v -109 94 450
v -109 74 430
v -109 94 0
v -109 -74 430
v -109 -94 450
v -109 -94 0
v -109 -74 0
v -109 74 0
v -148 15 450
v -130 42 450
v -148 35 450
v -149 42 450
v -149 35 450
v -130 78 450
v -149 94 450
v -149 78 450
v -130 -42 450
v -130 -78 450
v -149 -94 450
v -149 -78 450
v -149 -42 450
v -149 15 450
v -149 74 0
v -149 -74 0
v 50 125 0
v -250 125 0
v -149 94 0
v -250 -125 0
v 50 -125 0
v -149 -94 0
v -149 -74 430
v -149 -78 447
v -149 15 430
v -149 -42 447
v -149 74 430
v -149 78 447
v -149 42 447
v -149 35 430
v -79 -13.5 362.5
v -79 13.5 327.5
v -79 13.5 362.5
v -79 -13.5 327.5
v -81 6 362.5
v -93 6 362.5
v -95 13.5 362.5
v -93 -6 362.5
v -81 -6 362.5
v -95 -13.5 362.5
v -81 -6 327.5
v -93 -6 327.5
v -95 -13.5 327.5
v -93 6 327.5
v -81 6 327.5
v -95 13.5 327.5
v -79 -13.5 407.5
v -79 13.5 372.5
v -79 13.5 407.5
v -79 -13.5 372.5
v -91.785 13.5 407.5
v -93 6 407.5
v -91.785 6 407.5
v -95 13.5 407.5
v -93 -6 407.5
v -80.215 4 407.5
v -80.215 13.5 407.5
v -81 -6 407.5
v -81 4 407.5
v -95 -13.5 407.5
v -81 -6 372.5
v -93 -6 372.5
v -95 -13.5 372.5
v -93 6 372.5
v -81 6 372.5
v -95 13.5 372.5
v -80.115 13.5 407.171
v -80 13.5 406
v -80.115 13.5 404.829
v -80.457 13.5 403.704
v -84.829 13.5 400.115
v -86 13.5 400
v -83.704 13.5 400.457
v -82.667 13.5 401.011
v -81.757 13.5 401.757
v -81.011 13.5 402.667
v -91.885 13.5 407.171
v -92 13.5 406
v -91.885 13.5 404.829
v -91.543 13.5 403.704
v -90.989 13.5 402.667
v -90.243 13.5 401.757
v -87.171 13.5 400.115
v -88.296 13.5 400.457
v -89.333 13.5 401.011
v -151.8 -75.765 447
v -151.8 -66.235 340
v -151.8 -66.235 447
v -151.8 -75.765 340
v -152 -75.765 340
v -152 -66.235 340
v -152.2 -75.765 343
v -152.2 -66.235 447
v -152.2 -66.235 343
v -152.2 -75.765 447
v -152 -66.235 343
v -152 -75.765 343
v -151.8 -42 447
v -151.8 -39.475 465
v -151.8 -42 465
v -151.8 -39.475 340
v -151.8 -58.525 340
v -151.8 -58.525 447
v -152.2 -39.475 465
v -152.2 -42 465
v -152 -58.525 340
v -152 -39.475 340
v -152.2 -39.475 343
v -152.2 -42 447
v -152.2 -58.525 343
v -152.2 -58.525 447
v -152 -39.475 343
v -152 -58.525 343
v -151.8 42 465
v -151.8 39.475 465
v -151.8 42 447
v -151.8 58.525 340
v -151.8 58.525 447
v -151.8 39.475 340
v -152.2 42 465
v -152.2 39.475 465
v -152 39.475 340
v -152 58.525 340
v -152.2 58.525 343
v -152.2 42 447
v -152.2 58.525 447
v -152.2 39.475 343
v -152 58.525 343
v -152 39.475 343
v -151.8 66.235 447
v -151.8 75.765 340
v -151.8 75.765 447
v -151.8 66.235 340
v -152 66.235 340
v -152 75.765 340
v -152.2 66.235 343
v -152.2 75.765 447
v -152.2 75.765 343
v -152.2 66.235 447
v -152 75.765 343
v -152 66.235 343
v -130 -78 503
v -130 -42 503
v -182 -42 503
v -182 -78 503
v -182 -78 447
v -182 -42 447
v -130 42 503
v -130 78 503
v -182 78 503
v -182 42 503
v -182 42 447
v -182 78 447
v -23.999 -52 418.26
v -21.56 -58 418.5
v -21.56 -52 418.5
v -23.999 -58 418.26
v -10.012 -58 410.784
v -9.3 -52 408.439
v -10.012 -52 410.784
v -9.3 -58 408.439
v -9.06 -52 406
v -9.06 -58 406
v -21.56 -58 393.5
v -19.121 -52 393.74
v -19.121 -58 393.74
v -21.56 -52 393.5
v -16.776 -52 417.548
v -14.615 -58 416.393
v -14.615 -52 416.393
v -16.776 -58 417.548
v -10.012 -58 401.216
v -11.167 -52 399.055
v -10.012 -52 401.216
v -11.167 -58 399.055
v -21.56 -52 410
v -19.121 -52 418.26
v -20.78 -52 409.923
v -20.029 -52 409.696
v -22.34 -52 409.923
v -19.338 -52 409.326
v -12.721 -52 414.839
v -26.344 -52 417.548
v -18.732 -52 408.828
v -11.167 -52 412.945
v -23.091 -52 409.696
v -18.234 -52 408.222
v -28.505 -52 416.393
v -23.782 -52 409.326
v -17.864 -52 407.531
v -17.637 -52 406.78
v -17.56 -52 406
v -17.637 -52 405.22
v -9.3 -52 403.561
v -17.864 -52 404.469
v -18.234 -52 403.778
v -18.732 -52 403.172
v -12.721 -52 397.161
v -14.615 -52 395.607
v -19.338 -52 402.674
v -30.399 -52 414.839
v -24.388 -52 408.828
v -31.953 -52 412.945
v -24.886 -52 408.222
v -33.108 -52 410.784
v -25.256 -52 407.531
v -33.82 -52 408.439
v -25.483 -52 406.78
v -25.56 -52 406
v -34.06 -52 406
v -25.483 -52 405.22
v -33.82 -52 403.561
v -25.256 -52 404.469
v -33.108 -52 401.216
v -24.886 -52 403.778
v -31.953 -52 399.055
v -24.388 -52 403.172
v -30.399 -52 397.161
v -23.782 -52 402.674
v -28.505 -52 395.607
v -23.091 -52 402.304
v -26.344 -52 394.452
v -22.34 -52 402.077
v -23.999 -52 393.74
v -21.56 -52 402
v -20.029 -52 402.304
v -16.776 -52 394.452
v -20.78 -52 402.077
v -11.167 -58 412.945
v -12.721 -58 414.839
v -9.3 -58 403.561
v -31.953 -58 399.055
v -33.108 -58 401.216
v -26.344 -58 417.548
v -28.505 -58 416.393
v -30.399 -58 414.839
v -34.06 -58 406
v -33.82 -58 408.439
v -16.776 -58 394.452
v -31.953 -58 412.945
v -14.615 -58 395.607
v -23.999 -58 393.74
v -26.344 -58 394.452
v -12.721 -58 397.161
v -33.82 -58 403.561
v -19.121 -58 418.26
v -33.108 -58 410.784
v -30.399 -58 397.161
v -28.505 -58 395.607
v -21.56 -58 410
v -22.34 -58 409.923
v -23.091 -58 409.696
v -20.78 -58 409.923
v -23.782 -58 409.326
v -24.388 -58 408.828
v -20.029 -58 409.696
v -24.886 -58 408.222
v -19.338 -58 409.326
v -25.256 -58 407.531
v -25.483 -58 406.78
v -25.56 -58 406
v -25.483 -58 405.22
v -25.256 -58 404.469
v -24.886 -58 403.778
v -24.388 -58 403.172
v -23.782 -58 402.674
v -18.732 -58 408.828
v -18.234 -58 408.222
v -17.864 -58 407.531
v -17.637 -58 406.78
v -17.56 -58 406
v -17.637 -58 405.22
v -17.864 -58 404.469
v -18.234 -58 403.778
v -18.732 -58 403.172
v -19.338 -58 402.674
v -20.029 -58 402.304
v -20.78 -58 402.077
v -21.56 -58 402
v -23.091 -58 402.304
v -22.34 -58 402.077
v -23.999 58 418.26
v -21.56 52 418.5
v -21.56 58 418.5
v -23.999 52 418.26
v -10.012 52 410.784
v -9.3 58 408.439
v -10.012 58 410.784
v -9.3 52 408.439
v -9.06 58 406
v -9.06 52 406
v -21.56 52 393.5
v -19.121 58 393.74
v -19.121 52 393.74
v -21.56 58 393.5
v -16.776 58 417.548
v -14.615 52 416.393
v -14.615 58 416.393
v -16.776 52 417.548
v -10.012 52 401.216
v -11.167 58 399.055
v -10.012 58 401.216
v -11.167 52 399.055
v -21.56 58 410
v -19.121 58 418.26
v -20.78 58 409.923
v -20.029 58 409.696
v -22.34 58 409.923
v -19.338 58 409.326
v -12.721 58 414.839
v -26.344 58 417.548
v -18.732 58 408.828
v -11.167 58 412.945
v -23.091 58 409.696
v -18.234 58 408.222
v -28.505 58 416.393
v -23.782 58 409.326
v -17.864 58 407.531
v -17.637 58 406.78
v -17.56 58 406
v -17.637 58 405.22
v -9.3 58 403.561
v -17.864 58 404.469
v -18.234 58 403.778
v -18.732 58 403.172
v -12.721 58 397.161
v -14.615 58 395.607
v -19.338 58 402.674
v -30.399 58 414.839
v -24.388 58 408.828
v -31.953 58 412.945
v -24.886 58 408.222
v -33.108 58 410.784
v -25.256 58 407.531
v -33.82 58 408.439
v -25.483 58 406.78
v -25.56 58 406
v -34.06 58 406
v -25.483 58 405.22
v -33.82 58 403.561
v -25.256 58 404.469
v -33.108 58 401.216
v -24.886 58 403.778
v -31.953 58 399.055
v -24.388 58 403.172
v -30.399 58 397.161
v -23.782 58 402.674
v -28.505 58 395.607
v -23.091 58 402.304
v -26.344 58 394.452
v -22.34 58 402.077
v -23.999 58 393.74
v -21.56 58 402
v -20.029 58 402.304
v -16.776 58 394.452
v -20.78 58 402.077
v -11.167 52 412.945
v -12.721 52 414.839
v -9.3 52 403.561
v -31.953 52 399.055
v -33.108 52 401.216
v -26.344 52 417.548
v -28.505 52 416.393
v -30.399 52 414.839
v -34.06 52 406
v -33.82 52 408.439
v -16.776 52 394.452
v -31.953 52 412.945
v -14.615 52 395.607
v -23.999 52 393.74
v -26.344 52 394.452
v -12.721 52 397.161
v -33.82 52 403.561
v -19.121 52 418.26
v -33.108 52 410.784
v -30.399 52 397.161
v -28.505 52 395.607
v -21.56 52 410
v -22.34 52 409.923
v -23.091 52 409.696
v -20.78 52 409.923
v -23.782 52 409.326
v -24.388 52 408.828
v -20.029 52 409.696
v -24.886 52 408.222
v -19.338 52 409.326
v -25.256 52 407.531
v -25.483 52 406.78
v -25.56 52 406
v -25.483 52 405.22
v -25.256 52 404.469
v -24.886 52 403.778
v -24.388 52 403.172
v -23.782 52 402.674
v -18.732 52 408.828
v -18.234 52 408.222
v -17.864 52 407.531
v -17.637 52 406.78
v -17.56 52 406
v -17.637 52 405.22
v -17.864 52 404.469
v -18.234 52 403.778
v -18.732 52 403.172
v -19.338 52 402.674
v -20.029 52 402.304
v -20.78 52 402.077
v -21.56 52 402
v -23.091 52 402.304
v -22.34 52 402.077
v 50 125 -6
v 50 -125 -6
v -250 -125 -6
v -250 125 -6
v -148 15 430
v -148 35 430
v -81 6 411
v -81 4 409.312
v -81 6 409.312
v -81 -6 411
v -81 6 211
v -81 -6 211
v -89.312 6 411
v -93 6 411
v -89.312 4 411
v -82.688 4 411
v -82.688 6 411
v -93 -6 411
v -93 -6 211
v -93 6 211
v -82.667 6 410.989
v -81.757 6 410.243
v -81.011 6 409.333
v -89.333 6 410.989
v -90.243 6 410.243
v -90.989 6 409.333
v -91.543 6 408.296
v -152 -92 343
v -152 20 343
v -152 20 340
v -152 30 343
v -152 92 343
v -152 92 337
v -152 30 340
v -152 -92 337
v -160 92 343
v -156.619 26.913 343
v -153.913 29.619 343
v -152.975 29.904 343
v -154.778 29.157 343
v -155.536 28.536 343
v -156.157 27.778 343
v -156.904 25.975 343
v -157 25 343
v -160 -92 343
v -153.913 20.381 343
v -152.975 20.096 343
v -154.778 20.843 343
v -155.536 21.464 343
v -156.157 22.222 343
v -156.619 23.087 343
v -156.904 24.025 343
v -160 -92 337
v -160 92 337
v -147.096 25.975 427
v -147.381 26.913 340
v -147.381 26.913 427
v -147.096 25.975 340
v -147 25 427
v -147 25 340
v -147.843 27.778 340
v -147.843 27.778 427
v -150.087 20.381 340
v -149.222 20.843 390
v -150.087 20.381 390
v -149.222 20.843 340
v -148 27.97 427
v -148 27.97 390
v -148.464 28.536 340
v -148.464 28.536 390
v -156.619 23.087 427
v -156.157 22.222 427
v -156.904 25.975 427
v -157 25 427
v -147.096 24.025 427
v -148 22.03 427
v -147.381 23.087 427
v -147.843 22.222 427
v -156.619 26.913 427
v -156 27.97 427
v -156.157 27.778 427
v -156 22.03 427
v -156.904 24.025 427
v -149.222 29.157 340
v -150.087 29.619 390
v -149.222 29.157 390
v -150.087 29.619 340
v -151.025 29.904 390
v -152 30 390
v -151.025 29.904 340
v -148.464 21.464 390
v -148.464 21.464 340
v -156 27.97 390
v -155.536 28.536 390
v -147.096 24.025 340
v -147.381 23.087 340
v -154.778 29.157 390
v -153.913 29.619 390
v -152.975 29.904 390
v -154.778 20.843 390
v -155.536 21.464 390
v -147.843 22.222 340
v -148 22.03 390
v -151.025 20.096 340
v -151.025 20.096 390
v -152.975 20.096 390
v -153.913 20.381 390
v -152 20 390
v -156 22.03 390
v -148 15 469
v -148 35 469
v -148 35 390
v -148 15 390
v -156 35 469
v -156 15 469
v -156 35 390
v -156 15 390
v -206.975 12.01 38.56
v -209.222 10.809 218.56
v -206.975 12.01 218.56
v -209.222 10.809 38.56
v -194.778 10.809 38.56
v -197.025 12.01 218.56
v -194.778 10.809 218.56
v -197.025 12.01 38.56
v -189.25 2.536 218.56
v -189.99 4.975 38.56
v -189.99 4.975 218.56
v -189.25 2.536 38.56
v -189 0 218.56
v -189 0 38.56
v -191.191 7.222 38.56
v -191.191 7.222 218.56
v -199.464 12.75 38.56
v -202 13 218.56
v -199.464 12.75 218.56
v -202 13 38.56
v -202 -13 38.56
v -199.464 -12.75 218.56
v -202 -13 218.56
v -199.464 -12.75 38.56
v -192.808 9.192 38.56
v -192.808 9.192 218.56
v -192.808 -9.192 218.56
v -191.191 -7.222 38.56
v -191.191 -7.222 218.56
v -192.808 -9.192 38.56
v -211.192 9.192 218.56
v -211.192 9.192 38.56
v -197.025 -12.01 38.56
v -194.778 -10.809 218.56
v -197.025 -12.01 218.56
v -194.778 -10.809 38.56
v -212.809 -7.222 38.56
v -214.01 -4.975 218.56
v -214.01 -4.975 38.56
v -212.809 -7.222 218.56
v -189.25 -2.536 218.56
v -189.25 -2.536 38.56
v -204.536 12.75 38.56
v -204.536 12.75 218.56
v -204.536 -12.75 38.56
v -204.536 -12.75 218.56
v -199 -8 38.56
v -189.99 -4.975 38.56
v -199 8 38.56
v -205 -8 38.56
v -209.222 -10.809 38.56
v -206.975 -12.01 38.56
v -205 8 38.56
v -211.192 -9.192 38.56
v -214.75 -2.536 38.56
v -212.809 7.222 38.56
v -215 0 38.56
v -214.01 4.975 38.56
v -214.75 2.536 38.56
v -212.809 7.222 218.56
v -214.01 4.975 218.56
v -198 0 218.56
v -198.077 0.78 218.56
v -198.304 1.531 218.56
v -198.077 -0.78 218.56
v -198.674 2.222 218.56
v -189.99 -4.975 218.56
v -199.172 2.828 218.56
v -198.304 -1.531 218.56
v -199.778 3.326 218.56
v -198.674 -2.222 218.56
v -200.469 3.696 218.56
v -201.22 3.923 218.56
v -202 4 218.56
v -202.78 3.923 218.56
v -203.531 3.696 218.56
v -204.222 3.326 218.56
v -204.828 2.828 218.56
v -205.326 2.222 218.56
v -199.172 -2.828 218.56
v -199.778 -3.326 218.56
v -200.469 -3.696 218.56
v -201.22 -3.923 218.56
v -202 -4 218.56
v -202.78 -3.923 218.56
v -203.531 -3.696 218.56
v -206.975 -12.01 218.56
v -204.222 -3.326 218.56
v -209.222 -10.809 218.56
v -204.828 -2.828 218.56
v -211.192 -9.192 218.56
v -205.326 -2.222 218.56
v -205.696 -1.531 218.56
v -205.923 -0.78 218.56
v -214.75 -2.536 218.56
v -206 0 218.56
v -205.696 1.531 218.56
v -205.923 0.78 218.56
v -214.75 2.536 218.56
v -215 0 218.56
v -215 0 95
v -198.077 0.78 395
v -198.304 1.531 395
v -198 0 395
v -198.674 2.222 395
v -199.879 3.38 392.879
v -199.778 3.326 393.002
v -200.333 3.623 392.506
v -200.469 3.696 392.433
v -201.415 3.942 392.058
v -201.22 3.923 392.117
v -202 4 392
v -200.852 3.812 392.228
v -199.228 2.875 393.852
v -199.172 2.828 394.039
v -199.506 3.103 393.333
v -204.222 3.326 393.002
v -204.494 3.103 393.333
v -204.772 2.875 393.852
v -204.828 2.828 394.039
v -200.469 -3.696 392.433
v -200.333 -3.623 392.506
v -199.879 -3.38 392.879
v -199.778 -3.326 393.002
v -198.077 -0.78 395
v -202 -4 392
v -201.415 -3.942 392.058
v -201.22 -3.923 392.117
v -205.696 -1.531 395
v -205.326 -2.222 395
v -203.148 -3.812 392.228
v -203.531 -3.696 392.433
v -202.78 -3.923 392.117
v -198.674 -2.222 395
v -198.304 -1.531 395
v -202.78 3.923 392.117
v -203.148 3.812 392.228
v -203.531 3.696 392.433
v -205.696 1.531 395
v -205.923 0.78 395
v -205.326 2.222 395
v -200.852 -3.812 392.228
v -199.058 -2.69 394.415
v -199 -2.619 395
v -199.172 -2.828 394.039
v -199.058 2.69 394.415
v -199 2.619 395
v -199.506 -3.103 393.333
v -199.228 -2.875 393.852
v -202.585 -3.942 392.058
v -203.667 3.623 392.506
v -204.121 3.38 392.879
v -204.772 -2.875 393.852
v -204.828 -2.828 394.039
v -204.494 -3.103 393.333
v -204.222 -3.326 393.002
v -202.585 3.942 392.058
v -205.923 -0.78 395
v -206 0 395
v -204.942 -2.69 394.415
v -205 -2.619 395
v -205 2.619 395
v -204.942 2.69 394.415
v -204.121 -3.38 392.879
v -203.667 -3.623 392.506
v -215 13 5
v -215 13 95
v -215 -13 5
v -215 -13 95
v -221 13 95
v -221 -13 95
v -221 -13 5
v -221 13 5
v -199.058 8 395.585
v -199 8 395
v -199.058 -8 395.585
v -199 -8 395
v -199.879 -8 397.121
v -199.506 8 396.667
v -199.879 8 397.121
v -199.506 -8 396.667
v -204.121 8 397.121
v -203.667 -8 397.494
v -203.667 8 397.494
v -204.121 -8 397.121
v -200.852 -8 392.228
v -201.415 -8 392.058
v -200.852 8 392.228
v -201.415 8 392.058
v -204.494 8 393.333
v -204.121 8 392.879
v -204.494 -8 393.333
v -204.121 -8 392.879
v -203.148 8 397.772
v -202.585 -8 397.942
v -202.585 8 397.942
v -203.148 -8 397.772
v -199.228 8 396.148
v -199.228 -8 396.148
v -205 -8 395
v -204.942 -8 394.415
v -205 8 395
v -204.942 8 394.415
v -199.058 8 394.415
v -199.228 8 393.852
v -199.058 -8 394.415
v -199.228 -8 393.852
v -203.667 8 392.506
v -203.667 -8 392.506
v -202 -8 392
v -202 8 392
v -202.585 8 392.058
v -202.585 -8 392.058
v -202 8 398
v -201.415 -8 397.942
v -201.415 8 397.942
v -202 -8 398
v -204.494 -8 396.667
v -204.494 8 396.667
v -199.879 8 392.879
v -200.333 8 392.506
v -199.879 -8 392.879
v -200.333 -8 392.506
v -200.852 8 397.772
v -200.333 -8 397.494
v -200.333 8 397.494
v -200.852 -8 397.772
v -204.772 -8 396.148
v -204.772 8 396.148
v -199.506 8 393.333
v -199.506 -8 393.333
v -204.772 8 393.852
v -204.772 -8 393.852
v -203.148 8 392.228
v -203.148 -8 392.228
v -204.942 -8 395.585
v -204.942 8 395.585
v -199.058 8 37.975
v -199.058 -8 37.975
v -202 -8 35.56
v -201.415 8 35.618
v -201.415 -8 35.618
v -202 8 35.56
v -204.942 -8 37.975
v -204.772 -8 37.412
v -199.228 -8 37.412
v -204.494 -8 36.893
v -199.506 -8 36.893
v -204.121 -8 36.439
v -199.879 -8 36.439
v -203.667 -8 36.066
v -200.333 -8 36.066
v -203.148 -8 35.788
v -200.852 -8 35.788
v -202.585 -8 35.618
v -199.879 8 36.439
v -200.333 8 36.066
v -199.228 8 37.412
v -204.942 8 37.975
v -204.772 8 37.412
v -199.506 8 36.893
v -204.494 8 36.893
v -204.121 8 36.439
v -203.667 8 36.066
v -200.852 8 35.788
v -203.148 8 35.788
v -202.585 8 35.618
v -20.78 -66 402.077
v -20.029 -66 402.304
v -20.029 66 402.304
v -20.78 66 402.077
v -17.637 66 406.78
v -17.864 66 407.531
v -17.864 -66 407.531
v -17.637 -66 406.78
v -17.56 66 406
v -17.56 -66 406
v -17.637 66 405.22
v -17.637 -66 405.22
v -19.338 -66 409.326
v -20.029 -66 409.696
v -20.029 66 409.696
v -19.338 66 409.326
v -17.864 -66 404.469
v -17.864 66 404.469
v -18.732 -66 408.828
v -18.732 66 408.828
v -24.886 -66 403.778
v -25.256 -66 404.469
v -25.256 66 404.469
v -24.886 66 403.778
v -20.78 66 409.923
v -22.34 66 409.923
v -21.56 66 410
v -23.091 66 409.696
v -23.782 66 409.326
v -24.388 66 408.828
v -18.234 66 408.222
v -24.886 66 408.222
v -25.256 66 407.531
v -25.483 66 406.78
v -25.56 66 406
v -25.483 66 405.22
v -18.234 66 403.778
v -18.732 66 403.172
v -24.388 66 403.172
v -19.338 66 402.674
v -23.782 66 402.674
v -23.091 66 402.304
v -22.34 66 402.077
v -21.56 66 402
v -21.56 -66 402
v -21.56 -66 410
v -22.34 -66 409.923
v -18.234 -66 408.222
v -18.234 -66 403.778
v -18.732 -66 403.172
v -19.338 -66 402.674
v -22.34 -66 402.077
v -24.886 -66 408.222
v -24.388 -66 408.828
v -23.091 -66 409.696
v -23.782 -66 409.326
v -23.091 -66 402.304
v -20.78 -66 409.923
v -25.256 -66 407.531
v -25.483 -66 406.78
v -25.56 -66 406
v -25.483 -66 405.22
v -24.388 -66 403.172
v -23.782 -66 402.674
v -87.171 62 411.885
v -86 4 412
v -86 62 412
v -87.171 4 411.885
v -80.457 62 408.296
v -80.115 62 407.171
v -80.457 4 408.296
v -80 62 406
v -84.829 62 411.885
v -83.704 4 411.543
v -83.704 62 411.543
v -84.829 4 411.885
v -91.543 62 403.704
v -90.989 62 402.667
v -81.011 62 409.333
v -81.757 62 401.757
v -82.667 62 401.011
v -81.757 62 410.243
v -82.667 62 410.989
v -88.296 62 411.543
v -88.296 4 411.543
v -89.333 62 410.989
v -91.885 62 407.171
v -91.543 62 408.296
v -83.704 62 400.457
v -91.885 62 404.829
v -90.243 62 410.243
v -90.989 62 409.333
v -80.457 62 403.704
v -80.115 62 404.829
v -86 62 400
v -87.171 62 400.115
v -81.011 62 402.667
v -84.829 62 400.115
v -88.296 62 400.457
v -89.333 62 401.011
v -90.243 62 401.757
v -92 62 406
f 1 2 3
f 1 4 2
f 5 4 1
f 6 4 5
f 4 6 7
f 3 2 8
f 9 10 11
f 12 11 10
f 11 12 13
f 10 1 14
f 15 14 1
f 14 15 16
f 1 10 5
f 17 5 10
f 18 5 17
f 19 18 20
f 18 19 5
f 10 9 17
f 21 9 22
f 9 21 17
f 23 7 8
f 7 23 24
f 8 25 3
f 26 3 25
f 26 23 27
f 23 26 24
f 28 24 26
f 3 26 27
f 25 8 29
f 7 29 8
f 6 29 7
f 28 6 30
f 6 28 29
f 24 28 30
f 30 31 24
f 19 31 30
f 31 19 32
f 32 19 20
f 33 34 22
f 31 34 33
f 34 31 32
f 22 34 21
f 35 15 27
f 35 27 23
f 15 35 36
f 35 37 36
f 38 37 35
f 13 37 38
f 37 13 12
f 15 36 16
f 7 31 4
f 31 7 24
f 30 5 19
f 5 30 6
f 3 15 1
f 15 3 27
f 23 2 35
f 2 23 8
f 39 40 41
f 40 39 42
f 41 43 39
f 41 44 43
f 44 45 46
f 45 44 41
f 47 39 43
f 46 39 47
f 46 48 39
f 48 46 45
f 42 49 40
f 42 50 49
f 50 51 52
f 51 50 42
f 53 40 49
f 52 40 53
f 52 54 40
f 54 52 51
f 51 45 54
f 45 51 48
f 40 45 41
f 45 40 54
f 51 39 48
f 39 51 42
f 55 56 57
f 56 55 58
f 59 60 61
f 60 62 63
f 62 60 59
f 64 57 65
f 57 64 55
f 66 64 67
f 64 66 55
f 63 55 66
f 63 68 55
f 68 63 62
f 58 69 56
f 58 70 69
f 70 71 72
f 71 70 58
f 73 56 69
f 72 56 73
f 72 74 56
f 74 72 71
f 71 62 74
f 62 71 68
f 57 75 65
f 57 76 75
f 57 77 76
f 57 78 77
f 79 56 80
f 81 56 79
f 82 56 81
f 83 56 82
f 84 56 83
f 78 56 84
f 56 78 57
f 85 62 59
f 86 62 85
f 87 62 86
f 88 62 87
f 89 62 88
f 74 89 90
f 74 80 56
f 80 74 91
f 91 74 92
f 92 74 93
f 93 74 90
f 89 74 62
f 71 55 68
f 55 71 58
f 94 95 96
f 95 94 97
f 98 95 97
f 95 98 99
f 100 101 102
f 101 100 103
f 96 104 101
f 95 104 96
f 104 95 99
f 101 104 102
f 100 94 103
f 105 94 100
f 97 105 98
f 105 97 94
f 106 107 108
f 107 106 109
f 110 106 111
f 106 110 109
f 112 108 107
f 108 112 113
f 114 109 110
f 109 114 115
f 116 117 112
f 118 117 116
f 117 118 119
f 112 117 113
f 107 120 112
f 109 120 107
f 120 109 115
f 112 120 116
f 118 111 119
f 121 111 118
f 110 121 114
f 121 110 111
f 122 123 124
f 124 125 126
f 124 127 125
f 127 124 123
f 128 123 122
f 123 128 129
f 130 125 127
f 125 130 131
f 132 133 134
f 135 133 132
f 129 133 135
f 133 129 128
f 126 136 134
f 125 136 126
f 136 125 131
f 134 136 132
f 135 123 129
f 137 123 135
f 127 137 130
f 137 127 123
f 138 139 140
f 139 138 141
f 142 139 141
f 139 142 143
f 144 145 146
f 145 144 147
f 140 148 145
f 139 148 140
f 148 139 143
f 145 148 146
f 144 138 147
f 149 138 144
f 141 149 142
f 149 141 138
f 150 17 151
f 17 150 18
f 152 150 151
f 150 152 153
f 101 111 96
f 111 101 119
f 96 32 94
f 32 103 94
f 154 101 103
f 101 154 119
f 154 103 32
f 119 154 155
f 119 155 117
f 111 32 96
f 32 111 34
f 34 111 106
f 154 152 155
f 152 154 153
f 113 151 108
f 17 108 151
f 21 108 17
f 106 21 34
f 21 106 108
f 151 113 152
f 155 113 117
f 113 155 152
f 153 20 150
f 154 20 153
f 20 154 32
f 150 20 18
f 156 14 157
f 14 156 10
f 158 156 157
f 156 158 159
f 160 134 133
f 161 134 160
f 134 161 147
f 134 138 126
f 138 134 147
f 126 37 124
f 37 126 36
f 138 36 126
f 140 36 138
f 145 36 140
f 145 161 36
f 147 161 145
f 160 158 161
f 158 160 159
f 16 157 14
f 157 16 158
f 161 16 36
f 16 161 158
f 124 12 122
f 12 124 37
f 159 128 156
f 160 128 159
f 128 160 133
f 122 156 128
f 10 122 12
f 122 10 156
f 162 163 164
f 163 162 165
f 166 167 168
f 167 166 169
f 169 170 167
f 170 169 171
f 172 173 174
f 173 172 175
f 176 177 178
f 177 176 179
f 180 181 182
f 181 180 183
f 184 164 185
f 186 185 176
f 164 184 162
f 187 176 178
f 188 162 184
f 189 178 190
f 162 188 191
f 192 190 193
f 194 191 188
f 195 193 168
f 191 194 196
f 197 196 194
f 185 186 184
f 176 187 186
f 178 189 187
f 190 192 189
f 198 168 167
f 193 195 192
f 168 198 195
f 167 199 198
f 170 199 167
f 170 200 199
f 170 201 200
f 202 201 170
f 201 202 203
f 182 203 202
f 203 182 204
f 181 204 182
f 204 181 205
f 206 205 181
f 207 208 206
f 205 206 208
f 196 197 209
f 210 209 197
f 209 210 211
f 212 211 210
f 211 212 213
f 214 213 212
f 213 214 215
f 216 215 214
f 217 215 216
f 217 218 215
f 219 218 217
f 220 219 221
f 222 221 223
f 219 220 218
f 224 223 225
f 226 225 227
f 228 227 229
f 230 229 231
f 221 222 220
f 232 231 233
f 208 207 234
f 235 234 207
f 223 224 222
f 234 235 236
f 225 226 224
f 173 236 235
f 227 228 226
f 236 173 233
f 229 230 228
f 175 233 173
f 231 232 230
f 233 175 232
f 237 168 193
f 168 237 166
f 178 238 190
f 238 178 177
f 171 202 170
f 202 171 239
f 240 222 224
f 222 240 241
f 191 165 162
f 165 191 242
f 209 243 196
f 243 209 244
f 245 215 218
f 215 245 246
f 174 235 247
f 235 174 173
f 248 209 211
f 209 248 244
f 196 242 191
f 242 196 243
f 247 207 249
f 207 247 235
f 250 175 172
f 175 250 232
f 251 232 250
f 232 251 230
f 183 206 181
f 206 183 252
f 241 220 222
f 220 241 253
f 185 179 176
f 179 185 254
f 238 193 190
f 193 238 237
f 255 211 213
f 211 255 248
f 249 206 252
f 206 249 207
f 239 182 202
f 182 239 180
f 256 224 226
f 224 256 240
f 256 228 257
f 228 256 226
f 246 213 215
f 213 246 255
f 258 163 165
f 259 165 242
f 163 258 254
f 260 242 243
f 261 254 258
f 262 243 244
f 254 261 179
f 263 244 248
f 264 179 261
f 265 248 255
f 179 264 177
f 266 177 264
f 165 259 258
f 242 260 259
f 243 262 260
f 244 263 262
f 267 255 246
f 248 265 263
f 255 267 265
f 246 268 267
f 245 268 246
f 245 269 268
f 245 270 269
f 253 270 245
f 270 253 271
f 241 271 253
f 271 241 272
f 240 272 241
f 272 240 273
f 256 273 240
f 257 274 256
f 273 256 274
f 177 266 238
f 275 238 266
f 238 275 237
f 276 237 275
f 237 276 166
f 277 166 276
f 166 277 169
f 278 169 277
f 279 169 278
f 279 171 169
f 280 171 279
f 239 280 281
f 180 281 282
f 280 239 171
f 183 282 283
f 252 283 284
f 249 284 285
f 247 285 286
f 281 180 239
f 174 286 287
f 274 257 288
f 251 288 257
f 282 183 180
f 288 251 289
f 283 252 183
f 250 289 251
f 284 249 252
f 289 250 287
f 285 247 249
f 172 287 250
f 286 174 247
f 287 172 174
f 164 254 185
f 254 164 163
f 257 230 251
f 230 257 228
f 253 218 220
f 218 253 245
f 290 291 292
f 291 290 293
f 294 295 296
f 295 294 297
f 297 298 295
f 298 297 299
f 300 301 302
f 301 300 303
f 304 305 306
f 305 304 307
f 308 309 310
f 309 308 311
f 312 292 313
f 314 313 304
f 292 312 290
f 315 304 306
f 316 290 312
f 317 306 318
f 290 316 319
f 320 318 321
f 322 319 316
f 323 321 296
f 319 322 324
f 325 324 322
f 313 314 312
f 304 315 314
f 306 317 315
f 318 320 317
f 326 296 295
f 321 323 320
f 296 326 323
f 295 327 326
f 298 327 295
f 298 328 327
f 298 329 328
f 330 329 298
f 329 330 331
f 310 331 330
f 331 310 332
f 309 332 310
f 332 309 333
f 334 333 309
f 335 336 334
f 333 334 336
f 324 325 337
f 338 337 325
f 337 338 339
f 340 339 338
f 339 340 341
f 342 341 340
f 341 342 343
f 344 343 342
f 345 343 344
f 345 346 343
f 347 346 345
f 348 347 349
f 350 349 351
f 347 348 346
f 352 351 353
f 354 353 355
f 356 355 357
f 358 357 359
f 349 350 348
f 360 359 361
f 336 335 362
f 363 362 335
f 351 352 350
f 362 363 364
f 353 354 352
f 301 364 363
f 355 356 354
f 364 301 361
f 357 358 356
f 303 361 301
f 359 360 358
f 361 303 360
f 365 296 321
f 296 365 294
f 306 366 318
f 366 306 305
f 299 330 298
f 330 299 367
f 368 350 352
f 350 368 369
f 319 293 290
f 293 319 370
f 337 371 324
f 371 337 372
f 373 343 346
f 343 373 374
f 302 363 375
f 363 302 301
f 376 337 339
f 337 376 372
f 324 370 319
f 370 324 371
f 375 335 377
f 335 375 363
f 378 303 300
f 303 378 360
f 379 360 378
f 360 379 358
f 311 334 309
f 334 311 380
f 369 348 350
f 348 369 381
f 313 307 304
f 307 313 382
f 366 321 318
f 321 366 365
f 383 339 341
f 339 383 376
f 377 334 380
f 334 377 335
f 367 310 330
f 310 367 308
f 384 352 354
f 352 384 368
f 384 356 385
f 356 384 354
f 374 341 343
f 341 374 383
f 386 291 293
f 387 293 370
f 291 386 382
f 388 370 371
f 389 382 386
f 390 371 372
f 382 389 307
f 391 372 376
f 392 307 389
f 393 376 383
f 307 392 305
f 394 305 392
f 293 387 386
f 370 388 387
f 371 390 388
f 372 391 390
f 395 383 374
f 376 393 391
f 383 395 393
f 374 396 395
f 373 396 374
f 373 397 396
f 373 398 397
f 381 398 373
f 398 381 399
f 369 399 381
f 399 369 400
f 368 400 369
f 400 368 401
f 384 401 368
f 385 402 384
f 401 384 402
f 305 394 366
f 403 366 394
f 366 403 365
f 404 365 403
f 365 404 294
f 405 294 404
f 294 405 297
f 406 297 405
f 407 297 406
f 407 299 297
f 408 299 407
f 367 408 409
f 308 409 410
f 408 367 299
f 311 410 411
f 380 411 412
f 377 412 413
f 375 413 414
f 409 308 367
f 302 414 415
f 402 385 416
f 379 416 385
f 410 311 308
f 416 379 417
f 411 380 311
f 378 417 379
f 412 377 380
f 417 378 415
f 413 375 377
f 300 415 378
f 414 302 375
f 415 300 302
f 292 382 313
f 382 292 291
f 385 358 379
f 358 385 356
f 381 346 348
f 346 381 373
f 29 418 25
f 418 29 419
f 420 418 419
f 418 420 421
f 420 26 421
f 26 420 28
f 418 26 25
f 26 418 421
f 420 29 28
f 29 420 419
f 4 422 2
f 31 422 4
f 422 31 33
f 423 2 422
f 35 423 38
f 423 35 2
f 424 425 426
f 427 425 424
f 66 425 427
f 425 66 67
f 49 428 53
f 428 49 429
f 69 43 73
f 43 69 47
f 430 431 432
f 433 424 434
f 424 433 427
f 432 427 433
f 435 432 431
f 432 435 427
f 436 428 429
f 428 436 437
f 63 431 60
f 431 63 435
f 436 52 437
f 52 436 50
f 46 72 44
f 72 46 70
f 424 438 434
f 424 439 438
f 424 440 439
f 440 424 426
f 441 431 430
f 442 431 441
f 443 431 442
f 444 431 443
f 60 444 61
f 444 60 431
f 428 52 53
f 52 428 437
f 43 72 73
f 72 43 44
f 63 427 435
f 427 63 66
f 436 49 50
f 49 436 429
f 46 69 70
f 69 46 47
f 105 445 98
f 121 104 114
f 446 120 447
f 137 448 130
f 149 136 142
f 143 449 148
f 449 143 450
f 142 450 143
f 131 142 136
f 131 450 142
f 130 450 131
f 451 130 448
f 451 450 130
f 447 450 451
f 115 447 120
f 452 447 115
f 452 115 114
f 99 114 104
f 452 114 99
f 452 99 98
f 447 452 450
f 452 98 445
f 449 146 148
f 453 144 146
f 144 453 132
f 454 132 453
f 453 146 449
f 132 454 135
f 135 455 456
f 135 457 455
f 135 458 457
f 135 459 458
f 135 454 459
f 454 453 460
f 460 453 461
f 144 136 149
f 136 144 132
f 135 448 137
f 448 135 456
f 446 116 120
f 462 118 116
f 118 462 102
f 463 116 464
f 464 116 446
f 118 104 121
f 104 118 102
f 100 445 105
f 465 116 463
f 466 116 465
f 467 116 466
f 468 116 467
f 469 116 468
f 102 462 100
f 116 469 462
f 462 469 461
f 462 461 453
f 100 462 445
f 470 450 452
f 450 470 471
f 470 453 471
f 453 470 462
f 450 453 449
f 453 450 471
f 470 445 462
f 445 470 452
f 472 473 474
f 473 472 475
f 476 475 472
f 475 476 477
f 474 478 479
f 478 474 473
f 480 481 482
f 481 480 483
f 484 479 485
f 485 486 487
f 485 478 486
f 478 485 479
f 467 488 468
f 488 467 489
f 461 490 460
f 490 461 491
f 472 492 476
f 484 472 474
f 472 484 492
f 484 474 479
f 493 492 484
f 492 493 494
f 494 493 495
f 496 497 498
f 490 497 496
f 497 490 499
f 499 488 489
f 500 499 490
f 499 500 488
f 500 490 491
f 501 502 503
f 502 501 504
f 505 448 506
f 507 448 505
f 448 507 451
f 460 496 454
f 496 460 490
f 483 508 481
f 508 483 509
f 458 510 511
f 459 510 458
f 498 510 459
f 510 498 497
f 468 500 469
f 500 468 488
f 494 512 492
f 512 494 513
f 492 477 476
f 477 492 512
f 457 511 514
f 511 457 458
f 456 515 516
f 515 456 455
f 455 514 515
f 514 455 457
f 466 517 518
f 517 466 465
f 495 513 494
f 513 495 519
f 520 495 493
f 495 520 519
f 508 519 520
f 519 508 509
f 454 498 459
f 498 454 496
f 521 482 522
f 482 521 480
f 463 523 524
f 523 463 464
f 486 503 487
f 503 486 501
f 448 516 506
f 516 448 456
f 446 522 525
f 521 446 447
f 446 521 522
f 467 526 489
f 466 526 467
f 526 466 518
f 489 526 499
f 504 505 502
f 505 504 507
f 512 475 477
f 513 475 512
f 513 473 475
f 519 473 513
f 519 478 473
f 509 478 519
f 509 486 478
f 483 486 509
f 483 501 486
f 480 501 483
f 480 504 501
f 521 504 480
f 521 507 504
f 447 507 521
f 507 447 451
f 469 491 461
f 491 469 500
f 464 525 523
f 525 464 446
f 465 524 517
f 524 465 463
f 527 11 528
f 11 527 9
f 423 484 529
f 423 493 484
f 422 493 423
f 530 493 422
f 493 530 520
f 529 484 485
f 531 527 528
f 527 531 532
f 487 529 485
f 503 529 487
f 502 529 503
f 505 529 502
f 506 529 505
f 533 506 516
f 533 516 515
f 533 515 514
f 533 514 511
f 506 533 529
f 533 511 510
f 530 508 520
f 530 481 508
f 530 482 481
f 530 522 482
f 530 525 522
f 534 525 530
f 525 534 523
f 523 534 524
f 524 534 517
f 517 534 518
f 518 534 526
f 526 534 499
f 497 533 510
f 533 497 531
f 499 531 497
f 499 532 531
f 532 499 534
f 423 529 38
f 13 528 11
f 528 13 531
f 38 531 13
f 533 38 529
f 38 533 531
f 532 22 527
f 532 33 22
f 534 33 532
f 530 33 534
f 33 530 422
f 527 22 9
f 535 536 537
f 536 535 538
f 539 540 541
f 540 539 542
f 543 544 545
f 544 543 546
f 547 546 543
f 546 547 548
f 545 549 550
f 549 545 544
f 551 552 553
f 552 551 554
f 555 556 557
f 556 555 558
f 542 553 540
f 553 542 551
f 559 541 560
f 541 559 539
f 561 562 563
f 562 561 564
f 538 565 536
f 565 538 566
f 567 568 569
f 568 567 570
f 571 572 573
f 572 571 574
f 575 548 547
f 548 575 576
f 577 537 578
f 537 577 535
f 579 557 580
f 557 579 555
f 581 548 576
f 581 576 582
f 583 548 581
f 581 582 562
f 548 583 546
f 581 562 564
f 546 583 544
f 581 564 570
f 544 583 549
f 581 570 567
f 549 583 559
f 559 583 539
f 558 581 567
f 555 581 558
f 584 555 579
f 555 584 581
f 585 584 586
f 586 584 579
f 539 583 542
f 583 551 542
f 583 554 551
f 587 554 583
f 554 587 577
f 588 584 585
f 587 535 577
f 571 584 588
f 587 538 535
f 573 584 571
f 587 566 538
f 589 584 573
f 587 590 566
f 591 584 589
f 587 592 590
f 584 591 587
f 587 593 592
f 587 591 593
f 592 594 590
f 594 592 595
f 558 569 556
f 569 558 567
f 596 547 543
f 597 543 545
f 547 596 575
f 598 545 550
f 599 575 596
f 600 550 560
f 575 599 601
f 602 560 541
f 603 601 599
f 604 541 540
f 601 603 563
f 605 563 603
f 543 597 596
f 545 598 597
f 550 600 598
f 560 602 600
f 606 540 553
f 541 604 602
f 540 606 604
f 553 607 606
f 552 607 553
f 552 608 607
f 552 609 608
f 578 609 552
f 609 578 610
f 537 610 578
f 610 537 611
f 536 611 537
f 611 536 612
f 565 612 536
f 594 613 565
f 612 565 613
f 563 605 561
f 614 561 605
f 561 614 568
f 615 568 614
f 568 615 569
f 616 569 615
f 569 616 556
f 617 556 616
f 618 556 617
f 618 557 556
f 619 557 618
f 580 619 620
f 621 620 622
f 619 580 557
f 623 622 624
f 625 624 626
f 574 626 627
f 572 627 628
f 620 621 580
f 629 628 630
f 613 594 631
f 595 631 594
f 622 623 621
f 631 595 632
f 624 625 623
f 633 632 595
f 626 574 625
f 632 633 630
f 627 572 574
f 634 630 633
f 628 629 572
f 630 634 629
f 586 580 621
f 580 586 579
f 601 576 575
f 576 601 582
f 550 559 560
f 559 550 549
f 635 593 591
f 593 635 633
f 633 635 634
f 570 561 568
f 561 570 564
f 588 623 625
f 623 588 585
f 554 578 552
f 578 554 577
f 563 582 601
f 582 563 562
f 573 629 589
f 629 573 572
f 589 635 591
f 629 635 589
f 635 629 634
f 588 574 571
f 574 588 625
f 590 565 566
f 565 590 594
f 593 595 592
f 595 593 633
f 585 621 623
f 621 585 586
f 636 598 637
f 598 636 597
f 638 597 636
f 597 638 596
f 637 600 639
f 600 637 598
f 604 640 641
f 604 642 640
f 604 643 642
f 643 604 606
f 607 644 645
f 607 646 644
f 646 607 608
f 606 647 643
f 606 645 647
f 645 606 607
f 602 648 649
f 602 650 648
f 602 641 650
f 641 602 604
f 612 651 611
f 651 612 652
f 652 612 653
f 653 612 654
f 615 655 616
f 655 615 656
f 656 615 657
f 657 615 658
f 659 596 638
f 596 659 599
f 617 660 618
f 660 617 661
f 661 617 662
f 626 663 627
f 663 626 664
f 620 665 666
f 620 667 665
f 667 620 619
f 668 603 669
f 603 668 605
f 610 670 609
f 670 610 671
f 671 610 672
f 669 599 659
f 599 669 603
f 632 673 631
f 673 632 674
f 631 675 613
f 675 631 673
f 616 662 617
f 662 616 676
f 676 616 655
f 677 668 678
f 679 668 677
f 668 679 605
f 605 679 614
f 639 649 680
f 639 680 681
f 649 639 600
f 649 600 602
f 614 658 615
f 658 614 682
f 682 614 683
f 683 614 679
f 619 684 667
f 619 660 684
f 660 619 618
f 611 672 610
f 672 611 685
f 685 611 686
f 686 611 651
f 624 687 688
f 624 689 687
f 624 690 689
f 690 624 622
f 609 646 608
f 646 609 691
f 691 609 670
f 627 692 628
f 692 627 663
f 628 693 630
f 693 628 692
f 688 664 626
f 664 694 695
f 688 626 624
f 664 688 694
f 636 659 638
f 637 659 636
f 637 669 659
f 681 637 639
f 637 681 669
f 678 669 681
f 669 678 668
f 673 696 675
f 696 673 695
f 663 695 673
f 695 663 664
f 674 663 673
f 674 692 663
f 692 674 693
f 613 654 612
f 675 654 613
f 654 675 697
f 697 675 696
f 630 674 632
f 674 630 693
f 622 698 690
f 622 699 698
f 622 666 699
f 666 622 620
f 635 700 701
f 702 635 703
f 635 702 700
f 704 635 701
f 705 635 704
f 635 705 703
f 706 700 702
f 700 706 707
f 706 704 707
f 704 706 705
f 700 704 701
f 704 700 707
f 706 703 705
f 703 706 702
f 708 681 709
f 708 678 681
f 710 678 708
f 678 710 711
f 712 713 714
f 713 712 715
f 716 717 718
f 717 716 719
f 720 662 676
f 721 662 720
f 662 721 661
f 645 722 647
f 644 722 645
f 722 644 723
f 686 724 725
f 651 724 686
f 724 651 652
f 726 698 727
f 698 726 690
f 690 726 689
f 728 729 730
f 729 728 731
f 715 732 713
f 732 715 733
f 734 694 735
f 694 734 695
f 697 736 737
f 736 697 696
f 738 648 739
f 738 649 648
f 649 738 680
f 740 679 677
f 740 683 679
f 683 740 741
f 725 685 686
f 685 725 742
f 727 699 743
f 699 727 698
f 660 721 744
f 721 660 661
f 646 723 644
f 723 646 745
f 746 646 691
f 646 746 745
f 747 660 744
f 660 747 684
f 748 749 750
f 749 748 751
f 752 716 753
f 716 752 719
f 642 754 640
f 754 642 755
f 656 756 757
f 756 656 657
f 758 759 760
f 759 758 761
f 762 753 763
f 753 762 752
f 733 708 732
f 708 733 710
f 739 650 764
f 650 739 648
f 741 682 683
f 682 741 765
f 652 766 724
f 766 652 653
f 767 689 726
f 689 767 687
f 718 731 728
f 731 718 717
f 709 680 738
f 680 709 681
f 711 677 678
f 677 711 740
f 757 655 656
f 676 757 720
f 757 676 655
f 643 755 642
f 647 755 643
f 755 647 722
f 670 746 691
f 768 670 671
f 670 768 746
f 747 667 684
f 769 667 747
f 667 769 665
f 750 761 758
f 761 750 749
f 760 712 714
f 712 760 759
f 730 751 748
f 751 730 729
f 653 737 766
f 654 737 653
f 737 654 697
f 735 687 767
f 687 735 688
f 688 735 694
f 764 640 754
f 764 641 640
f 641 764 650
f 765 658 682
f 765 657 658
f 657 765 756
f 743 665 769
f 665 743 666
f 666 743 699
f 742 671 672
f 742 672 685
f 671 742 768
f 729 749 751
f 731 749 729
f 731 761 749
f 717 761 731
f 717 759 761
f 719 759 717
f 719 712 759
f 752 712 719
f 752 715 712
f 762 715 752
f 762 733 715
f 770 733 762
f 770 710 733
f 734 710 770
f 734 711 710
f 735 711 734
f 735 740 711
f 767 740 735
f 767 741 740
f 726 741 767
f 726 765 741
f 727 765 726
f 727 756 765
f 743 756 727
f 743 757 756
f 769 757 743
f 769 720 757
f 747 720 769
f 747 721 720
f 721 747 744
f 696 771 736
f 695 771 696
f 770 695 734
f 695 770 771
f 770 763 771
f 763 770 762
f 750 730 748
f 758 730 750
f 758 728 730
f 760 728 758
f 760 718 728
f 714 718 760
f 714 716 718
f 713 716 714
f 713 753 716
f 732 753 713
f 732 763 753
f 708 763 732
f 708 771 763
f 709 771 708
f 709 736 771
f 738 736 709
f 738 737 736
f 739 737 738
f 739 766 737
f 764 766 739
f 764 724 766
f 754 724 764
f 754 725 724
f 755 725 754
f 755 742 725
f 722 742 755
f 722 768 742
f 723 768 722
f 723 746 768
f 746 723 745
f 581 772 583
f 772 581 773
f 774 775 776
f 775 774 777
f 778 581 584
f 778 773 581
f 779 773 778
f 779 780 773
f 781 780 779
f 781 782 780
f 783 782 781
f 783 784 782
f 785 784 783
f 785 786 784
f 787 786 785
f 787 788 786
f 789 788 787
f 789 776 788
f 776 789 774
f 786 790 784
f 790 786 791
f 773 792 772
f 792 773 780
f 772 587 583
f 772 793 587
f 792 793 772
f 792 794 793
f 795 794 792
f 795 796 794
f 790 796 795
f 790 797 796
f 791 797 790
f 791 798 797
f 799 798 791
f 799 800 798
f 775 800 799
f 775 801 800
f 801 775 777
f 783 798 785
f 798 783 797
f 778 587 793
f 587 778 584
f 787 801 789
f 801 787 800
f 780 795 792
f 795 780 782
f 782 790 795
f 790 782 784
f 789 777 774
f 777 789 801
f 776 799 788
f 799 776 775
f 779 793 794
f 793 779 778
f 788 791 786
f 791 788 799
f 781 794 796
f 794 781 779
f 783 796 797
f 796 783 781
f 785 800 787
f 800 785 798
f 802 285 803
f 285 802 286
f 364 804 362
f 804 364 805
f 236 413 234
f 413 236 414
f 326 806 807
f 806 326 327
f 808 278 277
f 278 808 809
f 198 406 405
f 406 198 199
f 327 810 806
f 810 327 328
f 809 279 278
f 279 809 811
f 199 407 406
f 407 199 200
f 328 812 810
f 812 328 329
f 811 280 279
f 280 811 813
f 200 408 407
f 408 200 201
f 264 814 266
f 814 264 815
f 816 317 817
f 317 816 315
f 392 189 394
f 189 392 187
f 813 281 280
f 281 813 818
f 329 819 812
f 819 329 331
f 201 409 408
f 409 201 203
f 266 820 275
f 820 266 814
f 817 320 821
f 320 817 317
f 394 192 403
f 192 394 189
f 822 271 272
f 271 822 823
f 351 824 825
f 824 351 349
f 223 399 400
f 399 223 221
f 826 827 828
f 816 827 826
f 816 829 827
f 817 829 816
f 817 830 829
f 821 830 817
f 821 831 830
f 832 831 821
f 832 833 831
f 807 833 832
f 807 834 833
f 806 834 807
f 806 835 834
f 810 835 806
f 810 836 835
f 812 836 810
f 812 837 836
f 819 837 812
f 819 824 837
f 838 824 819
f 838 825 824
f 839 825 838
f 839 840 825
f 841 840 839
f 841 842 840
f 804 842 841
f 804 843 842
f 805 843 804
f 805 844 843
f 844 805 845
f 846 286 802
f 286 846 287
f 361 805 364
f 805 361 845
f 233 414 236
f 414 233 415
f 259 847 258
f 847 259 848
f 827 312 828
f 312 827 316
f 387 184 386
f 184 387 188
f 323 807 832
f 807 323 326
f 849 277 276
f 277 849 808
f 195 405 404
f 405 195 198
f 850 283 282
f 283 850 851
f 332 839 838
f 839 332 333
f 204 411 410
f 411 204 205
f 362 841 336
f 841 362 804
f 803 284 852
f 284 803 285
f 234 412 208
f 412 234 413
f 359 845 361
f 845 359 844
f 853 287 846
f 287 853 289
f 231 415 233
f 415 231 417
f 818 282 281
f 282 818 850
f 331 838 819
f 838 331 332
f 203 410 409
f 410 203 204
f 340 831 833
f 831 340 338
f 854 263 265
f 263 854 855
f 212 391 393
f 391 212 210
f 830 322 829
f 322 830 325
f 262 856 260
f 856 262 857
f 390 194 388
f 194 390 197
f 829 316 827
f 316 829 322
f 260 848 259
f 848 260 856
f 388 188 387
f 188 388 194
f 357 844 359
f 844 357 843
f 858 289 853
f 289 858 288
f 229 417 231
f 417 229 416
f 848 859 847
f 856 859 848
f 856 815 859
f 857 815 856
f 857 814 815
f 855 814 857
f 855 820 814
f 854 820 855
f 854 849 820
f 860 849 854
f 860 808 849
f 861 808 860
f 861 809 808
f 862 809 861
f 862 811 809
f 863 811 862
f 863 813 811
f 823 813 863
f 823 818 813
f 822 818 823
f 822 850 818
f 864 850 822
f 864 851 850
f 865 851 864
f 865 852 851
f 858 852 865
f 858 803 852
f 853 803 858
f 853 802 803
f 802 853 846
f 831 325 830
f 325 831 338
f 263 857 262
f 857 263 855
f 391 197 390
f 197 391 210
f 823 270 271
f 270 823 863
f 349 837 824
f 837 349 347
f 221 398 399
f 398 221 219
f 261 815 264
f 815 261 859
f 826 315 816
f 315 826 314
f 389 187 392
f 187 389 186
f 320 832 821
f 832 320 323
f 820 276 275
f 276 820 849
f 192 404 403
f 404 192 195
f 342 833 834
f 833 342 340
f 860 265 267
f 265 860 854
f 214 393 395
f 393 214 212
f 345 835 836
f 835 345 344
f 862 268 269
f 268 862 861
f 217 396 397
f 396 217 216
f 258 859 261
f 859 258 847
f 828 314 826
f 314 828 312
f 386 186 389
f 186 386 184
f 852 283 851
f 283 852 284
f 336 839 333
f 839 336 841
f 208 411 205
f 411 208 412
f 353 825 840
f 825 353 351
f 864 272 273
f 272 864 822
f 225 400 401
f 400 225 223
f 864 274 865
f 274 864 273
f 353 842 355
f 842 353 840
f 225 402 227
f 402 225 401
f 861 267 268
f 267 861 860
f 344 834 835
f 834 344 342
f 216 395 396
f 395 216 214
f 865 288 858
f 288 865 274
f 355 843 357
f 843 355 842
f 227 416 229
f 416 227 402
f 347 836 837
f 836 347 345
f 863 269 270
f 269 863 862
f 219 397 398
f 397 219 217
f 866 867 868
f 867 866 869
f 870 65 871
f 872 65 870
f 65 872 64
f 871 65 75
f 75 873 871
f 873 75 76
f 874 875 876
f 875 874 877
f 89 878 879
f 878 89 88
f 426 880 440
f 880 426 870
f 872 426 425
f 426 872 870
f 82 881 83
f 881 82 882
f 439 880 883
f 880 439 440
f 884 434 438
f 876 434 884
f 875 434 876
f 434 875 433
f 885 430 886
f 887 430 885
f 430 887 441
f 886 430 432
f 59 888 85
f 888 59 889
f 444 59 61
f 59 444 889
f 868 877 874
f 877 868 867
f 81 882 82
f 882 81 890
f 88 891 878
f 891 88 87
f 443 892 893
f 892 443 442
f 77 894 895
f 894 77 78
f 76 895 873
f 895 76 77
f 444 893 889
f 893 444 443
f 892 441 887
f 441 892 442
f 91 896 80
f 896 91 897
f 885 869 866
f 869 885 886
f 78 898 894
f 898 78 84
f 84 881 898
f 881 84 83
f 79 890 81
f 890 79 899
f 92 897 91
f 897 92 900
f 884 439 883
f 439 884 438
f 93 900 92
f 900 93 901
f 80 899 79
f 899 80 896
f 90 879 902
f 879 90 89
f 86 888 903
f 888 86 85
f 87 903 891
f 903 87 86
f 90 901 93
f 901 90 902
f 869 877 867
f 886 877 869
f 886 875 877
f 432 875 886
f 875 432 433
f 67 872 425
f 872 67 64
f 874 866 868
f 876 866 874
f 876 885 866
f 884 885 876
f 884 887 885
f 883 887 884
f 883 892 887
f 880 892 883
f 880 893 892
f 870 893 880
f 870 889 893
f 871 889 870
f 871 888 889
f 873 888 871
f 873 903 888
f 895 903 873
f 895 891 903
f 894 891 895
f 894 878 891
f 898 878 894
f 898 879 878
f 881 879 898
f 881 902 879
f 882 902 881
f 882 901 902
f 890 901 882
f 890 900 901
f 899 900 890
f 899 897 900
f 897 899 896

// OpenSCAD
// Physical stand mounting layout, mm in height_lock.scad's foot frame.
// Set height to top, middle, or bottom. Transparent parts are clearance
// envelopes. Fastener and clevis dimensions come from the purchased parts.
height = "top";
drop = height == "middle" ? 56.44 : height == "bottom" ? 112.88 : 0;
damper_retracted = 225; // replace with measured clevis-to-clevis value
damper_fixed_z = 395 - damper_retracted - 131.44;
trim_eye_z = 427; // adjust after measuring the installed constant-force strips
$fn = 32;

module block(c, size) {
    translate(c) cube(size, center=true);
}

module pin_y(c, size, diameter) {
    translate(c) rotate([90, 0, 0]) cylinder(h=size, d=diameter, center=true);
}

module vertical_span(x, y, a, b, diameter) {
    translate([x, y, (a+b)/2]) cylinder(h=abs(a-b), d=diameter, center=true);
}

// Frame base and rear crossmembers; make the under-load joints rigid.
color("dimgray") block([-100, 0, -3], [300, 250, 6]);
for (y = [-84, 84]) block([-129, y, 225], [40, 20, 450]);
block([-129, 0, 440], [40, 185, 20]);
block([-87, 0, 311], [12, 12, 200]);
for (z = [345, 390]) block([-87, 0, z-drop], [16, 27, 35]);

// Captive strip tails and rear carriage clevis ledges.
color("slategray") block([-156, 0, 340-drop], [8, 184, 6]);
for (side = [-1, 1]) {
    color("silver", .35) block([-156, side*60, 475], [52, 36, 56]);
    for (ds = [-11, 11]) {
        y = side*60 + ds;
        w = ds*side < 0 ? 19.05 : 9.53;
        color("silver") block([-152, y, (465 + 340-drop)/2], [.4, w, 465-(340-drop)]);
    }
}
color("orange") vertical_span(-152, 25, 340-drop, trim_eye_z, 10);
color("gray", .35) block([-152, 25, (390+469)/2], [8, 20, 79]);

// Damper flex clevises and mounting slot are dimensioned to their axes.
color("steelblue") vertical_span(-202, 0, damper_fixed_z, damper_fixed_z+180, 26);
color("silver") vertical_span(-202, 0, damper_fixed_z+180, 395-drop, 8);
color("gray", .35) block([-218, 0, 50], [6, 26, 90]);
pin_y([-202, 0, (395-drop)], 16, 6);
pin_y([-202, 0, damper_fixed_z], 16, 6);

// VESA hinge axis, pivot washer stacks and horizontal pin return pocket.
pin_y([-21.56, 0, 406-drop], 132, 8);
for (y = [-55, 55]) pin_y([-21.56, y, 406-drop], 6, 25);
color("orange", .4) pin_y([-86, 33, 406-drop], 56, 12);
pin_y([-86, 5, 406-drop], 2, 12);
pin_y([-86, 61, 406-drop], 2, 12);
